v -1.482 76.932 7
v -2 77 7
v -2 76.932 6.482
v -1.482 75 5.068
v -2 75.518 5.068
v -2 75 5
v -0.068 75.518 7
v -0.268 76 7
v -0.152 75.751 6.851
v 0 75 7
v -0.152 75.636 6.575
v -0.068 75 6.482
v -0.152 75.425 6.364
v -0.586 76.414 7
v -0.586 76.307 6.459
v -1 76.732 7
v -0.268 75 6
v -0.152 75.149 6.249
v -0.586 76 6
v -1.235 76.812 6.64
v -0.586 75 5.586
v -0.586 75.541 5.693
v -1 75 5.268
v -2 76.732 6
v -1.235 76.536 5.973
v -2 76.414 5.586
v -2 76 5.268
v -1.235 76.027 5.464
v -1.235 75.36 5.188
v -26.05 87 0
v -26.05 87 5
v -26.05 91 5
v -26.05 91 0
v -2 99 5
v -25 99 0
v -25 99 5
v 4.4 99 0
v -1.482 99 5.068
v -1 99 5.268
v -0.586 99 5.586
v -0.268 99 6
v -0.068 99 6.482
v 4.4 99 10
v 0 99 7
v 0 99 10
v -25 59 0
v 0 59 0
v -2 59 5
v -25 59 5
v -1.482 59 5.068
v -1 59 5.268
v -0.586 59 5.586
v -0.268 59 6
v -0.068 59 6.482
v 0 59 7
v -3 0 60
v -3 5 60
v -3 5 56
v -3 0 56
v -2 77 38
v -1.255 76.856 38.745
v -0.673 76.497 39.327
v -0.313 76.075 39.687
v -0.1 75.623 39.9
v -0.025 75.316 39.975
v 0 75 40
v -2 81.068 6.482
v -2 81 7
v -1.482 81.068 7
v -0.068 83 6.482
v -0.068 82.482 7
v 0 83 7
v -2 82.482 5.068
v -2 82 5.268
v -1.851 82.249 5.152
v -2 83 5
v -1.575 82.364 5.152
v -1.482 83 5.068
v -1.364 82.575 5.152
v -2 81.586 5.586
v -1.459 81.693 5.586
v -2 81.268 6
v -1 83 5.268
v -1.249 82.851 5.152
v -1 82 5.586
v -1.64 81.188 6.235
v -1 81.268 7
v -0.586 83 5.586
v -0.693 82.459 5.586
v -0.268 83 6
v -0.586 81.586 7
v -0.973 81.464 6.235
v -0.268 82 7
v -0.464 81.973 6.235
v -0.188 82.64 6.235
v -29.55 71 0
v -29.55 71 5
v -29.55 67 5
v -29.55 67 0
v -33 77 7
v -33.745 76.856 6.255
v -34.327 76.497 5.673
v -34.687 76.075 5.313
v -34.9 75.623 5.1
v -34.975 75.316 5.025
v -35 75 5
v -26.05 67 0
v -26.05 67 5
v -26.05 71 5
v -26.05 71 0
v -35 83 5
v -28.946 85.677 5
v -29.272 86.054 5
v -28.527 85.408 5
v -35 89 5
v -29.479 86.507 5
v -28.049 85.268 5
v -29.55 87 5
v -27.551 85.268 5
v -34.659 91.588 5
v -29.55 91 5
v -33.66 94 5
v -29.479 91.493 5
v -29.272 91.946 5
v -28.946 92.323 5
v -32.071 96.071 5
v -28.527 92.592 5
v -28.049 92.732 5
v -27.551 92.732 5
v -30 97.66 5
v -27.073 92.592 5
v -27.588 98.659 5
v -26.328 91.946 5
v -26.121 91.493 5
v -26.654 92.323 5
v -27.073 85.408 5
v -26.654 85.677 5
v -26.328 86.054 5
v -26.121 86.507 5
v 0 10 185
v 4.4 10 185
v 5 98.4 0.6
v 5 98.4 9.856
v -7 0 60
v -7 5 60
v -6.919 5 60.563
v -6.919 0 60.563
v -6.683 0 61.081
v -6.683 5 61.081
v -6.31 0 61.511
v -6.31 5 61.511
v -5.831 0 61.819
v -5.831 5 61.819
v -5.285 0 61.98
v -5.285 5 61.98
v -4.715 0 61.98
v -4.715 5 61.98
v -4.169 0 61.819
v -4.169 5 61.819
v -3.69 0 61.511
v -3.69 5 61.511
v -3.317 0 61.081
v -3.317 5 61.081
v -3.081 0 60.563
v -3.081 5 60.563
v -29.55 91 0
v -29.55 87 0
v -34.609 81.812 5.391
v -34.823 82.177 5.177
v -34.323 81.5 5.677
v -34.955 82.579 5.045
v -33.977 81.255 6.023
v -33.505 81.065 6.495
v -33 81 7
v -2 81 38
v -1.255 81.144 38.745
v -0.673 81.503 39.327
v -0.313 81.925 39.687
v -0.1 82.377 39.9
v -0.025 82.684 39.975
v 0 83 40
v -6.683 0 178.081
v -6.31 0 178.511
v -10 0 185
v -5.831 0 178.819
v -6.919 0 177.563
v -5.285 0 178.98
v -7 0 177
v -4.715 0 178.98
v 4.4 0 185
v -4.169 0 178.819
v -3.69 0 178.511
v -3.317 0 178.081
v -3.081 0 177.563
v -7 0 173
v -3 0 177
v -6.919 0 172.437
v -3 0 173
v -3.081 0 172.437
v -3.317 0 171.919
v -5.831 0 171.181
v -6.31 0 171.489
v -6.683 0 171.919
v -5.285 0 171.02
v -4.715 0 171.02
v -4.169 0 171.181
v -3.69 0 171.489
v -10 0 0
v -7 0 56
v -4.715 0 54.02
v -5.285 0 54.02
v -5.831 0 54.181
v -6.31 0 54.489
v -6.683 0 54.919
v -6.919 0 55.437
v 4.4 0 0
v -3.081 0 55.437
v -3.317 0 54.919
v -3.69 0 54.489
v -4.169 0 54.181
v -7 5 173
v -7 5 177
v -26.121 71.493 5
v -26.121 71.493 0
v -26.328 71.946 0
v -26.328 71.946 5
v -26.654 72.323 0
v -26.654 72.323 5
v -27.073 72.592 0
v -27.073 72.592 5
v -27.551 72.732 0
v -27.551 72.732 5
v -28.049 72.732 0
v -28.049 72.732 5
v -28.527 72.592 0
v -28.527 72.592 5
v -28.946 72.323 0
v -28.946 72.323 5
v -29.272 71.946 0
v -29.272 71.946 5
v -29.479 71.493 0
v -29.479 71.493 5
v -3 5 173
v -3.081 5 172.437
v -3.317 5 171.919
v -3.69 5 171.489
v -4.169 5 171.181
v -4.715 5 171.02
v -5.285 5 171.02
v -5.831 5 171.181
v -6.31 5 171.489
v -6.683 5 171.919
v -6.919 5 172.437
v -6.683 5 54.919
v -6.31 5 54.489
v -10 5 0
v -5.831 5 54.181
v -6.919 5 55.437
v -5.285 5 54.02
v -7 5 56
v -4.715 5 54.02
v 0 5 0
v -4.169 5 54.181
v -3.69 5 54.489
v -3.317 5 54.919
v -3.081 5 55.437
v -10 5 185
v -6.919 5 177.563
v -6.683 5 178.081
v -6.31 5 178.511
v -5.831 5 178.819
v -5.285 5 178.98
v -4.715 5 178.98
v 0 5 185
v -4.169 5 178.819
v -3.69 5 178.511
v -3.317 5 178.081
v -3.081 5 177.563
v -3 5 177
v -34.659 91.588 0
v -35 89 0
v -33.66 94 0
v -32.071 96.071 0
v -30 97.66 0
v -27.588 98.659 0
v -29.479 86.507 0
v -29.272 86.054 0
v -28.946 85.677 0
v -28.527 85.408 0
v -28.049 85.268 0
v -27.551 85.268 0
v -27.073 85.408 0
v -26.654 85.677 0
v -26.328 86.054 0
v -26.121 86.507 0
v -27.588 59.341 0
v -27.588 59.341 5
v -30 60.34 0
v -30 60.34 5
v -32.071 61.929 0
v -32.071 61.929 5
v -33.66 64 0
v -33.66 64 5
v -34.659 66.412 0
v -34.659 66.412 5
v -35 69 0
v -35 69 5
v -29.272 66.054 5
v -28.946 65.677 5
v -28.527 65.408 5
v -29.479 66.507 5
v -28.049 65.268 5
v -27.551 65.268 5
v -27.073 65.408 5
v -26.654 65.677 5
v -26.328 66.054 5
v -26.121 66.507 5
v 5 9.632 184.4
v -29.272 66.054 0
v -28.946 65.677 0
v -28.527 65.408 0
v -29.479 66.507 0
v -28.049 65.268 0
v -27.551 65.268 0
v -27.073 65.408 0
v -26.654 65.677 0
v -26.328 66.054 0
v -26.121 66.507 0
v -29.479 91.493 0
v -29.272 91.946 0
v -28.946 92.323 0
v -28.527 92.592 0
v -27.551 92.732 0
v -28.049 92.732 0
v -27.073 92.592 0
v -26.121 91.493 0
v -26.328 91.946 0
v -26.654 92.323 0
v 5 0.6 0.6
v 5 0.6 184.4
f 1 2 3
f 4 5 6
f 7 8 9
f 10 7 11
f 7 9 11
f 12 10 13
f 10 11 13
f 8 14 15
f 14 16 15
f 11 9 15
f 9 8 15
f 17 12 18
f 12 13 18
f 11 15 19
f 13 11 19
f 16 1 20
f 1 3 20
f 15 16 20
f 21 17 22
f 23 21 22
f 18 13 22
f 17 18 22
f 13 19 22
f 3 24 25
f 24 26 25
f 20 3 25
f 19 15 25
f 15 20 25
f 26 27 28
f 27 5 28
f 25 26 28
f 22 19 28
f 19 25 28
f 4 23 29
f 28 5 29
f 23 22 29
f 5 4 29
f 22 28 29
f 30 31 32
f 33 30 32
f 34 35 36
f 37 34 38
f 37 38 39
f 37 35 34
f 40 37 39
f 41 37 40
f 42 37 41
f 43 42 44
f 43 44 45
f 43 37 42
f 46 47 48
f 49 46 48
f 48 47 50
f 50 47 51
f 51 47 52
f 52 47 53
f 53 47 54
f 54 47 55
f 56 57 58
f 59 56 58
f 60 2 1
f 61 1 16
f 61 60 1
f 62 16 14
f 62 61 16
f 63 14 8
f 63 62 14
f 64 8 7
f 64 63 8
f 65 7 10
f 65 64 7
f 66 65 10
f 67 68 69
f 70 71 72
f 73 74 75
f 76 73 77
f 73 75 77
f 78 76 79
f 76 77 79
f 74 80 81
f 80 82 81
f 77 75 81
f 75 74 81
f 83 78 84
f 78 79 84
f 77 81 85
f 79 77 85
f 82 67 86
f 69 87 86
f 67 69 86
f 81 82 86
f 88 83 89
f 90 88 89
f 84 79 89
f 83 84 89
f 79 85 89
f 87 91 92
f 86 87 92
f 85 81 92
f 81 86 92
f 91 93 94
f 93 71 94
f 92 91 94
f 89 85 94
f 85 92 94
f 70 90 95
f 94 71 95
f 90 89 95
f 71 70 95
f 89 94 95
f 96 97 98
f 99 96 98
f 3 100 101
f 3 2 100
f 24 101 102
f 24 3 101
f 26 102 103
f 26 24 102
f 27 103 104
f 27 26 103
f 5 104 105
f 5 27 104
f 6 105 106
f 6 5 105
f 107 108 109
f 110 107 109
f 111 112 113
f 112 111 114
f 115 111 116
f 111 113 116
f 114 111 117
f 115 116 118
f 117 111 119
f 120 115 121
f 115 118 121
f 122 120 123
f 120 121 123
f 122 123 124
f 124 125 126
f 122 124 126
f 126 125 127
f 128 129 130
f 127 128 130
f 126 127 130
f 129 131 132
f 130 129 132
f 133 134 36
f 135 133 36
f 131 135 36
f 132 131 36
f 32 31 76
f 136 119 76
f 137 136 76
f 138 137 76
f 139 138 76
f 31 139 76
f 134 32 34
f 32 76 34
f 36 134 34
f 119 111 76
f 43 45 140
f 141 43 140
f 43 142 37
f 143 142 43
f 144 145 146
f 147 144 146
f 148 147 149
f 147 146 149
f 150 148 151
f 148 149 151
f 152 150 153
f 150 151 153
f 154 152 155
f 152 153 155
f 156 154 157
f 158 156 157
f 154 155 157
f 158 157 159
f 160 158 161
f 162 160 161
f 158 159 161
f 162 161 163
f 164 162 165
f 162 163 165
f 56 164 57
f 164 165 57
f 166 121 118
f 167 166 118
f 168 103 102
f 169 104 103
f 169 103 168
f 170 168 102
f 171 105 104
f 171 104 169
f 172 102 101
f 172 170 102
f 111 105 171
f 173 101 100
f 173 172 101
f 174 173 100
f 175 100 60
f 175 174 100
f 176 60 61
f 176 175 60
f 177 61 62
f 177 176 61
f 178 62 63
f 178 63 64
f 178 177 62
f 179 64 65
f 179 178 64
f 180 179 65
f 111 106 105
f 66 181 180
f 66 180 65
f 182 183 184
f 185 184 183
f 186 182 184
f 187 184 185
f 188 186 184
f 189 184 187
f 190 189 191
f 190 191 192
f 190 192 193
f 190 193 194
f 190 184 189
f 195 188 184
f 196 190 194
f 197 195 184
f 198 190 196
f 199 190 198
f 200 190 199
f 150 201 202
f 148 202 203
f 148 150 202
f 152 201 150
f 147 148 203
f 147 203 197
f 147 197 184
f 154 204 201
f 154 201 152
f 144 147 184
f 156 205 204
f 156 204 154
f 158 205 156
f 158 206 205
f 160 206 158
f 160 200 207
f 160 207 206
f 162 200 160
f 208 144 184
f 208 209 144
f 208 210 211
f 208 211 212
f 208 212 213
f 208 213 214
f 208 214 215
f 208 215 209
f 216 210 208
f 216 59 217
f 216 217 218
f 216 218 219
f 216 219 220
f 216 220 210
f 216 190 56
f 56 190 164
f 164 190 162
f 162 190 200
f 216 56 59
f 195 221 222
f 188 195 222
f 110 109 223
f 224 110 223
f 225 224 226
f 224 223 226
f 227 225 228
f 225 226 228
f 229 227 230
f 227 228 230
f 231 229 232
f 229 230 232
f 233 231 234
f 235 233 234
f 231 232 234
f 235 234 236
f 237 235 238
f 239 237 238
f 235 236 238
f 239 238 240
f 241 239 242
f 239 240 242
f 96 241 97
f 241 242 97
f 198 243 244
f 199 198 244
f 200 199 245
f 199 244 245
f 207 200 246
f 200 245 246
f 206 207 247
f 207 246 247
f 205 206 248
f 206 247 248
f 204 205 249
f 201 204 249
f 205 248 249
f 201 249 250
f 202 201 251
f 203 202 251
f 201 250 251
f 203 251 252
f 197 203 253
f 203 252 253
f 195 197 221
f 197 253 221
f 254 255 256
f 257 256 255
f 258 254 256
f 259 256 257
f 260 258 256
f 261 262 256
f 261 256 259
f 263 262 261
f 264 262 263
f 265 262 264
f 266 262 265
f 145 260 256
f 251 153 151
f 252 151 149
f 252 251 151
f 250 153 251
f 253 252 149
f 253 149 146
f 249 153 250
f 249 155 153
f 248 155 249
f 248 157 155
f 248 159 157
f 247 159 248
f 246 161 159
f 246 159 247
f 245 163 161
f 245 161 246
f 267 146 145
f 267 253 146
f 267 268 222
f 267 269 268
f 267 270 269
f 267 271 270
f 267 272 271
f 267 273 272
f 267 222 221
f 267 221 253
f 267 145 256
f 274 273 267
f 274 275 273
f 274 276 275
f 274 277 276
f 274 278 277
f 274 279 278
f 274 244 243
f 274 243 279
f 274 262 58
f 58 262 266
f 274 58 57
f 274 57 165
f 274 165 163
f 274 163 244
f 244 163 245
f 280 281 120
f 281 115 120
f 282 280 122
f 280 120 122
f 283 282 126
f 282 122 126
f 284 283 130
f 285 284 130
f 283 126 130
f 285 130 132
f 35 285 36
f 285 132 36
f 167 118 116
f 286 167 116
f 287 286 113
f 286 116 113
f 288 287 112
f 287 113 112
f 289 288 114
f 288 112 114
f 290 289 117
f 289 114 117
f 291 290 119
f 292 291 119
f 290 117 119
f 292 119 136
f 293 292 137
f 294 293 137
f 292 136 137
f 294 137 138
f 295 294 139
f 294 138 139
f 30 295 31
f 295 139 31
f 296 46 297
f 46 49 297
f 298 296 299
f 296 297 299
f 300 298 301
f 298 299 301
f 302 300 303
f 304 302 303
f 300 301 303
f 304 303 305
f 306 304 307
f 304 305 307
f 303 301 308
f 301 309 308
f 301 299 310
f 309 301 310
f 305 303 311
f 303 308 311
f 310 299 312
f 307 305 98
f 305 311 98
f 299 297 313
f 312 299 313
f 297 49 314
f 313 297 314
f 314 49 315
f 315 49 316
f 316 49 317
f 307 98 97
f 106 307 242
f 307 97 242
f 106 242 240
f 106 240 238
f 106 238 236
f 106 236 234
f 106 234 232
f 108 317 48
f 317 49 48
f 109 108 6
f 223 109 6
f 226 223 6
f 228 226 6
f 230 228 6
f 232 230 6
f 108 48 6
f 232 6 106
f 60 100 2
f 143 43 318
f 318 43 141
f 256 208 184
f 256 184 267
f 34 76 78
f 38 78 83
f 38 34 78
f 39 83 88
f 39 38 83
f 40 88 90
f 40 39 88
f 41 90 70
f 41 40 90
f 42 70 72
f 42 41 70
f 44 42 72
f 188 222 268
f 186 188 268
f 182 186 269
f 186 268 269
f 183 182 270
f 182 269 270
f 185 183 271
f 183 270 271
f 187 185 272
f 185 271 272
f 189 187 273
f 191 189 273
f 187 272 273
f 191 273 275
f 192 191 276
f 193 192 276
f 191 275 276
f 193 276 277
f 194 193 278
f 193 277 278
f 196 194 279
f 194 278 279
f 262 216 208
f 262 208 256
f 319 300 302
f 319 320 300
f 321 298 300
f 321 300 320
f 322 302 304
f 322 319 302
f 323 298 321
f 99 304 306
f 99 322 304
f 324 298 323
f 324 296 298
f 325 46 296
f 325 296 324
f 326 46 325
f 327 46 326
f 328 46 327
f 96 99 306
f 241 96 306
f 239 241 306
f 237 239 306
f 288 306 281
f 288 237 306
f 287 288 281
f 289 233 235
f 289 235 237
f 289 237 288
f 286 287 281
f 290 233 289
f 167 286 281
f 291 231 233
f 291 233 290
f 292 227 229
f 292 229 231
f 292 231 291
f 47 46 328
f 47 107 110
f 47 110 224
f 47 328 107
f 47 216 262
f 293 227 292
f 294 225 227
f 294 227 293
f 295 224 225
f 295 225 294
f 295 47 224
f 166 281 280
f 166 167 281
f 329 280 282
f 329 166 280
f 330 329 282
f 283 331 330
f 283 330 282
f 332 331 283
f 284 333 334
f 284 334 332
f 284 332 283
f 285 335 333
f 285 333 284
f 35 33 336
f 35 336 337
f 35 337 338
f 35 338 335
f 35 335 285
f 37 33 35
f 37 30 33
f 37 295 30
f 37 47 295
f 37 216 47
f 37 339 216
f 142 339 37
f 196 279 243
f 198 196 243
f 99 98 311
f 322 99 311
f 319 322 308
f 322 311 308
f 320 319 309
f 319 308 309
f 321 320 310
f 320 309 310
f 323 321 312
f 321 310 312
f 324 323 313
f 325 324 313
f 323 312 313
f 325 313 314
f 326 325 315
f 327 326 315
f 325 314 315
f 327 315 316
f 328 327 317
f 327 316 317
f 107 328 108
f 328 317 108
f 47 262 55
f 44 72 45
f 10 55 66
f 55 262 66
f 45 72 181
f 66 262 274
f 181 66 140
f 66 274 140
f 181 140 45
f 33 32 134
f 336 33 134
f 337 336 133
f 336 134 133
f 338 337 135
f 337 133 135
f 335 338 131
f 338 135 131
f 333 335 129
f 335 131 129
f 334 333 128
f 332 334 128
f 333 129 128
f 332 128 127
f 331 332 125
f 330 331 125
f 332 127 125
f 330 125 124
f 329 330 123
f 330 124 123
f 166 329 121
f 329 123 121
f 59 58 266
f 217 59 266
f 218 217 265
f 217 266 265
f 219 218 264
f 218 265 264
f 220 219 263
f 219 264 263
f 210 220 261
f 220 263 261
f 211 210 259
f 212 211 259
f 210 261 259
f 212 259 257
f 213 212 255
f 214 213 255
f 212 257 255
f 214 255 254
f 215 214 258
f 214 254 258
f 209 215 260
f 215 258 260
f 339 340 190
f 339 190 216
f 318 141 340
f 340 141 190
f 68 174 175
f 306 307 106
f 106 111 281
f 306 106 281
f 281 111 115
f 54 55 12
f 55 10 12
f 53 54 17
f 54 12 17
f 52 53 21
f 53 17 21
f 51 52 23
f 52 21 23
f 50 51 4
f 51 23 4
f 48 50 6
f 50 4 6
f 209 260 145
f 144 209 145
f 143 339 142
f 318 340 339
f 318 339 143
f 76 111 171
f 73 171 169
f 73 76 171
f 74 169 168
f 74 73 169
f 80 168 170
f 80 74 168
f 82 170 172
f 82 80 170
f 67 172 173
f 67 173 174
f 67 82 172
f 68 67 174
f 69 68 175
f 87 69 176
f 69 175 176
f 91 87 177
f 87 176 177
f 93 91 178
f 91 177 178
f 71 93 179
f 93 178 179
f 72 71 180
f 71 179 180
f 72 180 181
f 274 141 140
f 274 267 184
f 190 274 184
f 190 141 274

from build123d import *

# Parameters (mm, degrees)
F0_W        = 54
F0_H        = 5
F0_W_2      = 40
F1_DEPTH    = 5
F2_DEPTH    = 10
F3_DEPTH    = 35
F5_DEPTH    = 5.001
F7_DEPTH    = 5.001
F4_W        = 35
F4_H        = 4
F8_DEPTH    = 40
F9_T4_DEPTH = 106.8673195186
F10_R       = 2
F11_R       = 10
F12_SIZE    = 0.6


# Not quite as in the source:
# - a fillet or chamfer that OpenCascade refuses, or shapes differently, is made with other operations: its cross-section is extruded or revolved along the edge and cut away or added


with BuildPart() as f1:
    # F0 (on Right) → F1 (new body)
    with BuildSketch(Plane.YZ):
        Polygon((0, 185), (0, 0), (5, 0), (5, 5), (5, 185), align=None)
        with Locations((32, 2.5)):
            Rectangle(F0_W, F0_H)
        Polygon((10, 185), (5, 185), (5, 5), (59, 5), (99, 5), (99, 10), align=None)
        with Locations((79, 2.5)):
            Rectangle(F0_W_2, F0_H)
    extrude(amount=F1_DEPTH)

    # F0 (on Right) → F2 (join)
    with BuildSketch(Plane.YZ):
        Polygon((0, 185), (0, 0), (5, 0), (5, 5), (5, 185), align=None)
    extrude(amount=-F2_DEPTH)

    # F0 (on Right) → F3 (join)
    with BuildSketch(Plane.YZ):
        with Locations((79, 2.5)):
            Rectangle(F0_W_2, F0_H)
    extrude(amount=-F3_DEPTH)

    # F4 (on face) → F5 (cut, through all)
    with BuildSketch(Plane.XY.offset(5)):
        with BuildLine():
            Line((-26.05, 69), (-26.05, 71))
            ThreePointArc((-26.05, 71), (-27.8, 72.75), (-29.55, 71))
            Line((-29.55, 71), (-29.55, 69))
            Line((-29.55, 69), (-29.55, 67))
            ThreePointArc((-29.55, 67), (-27.8, 65.25), (-26.05, 67))
            Line((-26.05, 67), (-26.05, 69))
        make_face()
        with BuildLine():
            Line((-26.05, 89), (-26.05, 91))
            ThreePointArc((-26.05, 91), (-27.8, 92.75), (-29.55, 91))
            Line((-29.55, 91), (-29.55, 89))
            Line((-29.55, 89), (-29.55, 87))
            ThreePointArc((-29.55, 87), (-27.8, 85.25), (-26.05, 87))
            Line((-26.05, 87), (-26.05, 89))
        make_face()
    extrude(amount=-F5_DEPTH, mode=Mode.SUBTRACT)

    # F6 (on face) → F7 (cut, through all)
    with BuildSketch(Plane(origin=(0, 5, 0), x_dir=(-1, 0, 0), z_dir=(0, 1, 0))):
        with BuildLine():
            Line((7, 58), (7, 60))
            ThreePointArc((7, 60), (5, 62), (3, 60))
            Line((3, 60), (3, 58))
            Line((3, 58), (3, 56))
            ThreePointArc((3, 56), (5, 54), (7, 56))
            Line((7, 56), (7, 58))
        make_face()
        with BuildLine():
            Line((7, 175), (7, 177))
            ThreePointArc((7, 177), (5, 179), (3, 177))
            Line((3, 177), (3, 175))
            Line((3, 175), (3, 173))
            ThreePointArc((3, 173), (5, 171), (7, 173))
            Line((7, 173), (7, 175))
        make_face()
    extrude(amount=-F7_DEPTH, mode=Mode.SUBTRACT)

    # F4 (on face) → F8 (join)
    with BuildSketch(Plane.XY.offset(5)):
        with Locations((-17.5, 79)):
            Rectangle(F4_W, F4_H)
    extrude(amount=F8_DEPTH)

    # F9: chamfer of 40 on 1 edges, made by hand


with BuildPart() as f9_tool2:
    # F9_s3 → F9_t4 (new body)
    with BuildSketch(Plane.XZ.offset(-183.8673195186)):
        Polygon((-35, 5), (5, 45), (-35, 45), align=None)
    extrude(amount=F9_T4_DEPTH)

    split(bisect_by=Plane.YZ, keep=Keep.BOTTOM)


with BuildPart() as f1_1:
    add(f1.part)

    # F9_t1: cut F9_tool2
    add(f9_tool2.part, mode=Mode.SUBTRACT)

    # F10
    f10_edges = [f1_1.edges().sort_by_distance(p)[0] for p in [
        (-17.5, 77, 5),
        (0, 77, 22.5),
        (0, 81, 22.5),
        (-17.5, 81, 5),
        (0, 68, 5),
        (0, 90, 5),
    ]]
    fillet(f10_edges, radius=F10_R)

    # F11
    f11_edges = [f1_1.edges().sort_by_distance(p)[0] for p in [
        (-35, 59, 2.5),
        (-35, 99, 2.5),
    ]]
    fillet(f11_edges, radius=F11_R)

    # F12
    f12_edges = [f1_1.edges().sort_by_distance(p)[0] for p in [
        (5, 0, 92.5),
        (5, 49.5, 0),
        (5, 99, 5),
        (5, 54.5, 97.5),
        (5, 5, 185),
    ]]
    chamfer(f12_edges, length=F12_SIZE)


solid = f1_1.part
